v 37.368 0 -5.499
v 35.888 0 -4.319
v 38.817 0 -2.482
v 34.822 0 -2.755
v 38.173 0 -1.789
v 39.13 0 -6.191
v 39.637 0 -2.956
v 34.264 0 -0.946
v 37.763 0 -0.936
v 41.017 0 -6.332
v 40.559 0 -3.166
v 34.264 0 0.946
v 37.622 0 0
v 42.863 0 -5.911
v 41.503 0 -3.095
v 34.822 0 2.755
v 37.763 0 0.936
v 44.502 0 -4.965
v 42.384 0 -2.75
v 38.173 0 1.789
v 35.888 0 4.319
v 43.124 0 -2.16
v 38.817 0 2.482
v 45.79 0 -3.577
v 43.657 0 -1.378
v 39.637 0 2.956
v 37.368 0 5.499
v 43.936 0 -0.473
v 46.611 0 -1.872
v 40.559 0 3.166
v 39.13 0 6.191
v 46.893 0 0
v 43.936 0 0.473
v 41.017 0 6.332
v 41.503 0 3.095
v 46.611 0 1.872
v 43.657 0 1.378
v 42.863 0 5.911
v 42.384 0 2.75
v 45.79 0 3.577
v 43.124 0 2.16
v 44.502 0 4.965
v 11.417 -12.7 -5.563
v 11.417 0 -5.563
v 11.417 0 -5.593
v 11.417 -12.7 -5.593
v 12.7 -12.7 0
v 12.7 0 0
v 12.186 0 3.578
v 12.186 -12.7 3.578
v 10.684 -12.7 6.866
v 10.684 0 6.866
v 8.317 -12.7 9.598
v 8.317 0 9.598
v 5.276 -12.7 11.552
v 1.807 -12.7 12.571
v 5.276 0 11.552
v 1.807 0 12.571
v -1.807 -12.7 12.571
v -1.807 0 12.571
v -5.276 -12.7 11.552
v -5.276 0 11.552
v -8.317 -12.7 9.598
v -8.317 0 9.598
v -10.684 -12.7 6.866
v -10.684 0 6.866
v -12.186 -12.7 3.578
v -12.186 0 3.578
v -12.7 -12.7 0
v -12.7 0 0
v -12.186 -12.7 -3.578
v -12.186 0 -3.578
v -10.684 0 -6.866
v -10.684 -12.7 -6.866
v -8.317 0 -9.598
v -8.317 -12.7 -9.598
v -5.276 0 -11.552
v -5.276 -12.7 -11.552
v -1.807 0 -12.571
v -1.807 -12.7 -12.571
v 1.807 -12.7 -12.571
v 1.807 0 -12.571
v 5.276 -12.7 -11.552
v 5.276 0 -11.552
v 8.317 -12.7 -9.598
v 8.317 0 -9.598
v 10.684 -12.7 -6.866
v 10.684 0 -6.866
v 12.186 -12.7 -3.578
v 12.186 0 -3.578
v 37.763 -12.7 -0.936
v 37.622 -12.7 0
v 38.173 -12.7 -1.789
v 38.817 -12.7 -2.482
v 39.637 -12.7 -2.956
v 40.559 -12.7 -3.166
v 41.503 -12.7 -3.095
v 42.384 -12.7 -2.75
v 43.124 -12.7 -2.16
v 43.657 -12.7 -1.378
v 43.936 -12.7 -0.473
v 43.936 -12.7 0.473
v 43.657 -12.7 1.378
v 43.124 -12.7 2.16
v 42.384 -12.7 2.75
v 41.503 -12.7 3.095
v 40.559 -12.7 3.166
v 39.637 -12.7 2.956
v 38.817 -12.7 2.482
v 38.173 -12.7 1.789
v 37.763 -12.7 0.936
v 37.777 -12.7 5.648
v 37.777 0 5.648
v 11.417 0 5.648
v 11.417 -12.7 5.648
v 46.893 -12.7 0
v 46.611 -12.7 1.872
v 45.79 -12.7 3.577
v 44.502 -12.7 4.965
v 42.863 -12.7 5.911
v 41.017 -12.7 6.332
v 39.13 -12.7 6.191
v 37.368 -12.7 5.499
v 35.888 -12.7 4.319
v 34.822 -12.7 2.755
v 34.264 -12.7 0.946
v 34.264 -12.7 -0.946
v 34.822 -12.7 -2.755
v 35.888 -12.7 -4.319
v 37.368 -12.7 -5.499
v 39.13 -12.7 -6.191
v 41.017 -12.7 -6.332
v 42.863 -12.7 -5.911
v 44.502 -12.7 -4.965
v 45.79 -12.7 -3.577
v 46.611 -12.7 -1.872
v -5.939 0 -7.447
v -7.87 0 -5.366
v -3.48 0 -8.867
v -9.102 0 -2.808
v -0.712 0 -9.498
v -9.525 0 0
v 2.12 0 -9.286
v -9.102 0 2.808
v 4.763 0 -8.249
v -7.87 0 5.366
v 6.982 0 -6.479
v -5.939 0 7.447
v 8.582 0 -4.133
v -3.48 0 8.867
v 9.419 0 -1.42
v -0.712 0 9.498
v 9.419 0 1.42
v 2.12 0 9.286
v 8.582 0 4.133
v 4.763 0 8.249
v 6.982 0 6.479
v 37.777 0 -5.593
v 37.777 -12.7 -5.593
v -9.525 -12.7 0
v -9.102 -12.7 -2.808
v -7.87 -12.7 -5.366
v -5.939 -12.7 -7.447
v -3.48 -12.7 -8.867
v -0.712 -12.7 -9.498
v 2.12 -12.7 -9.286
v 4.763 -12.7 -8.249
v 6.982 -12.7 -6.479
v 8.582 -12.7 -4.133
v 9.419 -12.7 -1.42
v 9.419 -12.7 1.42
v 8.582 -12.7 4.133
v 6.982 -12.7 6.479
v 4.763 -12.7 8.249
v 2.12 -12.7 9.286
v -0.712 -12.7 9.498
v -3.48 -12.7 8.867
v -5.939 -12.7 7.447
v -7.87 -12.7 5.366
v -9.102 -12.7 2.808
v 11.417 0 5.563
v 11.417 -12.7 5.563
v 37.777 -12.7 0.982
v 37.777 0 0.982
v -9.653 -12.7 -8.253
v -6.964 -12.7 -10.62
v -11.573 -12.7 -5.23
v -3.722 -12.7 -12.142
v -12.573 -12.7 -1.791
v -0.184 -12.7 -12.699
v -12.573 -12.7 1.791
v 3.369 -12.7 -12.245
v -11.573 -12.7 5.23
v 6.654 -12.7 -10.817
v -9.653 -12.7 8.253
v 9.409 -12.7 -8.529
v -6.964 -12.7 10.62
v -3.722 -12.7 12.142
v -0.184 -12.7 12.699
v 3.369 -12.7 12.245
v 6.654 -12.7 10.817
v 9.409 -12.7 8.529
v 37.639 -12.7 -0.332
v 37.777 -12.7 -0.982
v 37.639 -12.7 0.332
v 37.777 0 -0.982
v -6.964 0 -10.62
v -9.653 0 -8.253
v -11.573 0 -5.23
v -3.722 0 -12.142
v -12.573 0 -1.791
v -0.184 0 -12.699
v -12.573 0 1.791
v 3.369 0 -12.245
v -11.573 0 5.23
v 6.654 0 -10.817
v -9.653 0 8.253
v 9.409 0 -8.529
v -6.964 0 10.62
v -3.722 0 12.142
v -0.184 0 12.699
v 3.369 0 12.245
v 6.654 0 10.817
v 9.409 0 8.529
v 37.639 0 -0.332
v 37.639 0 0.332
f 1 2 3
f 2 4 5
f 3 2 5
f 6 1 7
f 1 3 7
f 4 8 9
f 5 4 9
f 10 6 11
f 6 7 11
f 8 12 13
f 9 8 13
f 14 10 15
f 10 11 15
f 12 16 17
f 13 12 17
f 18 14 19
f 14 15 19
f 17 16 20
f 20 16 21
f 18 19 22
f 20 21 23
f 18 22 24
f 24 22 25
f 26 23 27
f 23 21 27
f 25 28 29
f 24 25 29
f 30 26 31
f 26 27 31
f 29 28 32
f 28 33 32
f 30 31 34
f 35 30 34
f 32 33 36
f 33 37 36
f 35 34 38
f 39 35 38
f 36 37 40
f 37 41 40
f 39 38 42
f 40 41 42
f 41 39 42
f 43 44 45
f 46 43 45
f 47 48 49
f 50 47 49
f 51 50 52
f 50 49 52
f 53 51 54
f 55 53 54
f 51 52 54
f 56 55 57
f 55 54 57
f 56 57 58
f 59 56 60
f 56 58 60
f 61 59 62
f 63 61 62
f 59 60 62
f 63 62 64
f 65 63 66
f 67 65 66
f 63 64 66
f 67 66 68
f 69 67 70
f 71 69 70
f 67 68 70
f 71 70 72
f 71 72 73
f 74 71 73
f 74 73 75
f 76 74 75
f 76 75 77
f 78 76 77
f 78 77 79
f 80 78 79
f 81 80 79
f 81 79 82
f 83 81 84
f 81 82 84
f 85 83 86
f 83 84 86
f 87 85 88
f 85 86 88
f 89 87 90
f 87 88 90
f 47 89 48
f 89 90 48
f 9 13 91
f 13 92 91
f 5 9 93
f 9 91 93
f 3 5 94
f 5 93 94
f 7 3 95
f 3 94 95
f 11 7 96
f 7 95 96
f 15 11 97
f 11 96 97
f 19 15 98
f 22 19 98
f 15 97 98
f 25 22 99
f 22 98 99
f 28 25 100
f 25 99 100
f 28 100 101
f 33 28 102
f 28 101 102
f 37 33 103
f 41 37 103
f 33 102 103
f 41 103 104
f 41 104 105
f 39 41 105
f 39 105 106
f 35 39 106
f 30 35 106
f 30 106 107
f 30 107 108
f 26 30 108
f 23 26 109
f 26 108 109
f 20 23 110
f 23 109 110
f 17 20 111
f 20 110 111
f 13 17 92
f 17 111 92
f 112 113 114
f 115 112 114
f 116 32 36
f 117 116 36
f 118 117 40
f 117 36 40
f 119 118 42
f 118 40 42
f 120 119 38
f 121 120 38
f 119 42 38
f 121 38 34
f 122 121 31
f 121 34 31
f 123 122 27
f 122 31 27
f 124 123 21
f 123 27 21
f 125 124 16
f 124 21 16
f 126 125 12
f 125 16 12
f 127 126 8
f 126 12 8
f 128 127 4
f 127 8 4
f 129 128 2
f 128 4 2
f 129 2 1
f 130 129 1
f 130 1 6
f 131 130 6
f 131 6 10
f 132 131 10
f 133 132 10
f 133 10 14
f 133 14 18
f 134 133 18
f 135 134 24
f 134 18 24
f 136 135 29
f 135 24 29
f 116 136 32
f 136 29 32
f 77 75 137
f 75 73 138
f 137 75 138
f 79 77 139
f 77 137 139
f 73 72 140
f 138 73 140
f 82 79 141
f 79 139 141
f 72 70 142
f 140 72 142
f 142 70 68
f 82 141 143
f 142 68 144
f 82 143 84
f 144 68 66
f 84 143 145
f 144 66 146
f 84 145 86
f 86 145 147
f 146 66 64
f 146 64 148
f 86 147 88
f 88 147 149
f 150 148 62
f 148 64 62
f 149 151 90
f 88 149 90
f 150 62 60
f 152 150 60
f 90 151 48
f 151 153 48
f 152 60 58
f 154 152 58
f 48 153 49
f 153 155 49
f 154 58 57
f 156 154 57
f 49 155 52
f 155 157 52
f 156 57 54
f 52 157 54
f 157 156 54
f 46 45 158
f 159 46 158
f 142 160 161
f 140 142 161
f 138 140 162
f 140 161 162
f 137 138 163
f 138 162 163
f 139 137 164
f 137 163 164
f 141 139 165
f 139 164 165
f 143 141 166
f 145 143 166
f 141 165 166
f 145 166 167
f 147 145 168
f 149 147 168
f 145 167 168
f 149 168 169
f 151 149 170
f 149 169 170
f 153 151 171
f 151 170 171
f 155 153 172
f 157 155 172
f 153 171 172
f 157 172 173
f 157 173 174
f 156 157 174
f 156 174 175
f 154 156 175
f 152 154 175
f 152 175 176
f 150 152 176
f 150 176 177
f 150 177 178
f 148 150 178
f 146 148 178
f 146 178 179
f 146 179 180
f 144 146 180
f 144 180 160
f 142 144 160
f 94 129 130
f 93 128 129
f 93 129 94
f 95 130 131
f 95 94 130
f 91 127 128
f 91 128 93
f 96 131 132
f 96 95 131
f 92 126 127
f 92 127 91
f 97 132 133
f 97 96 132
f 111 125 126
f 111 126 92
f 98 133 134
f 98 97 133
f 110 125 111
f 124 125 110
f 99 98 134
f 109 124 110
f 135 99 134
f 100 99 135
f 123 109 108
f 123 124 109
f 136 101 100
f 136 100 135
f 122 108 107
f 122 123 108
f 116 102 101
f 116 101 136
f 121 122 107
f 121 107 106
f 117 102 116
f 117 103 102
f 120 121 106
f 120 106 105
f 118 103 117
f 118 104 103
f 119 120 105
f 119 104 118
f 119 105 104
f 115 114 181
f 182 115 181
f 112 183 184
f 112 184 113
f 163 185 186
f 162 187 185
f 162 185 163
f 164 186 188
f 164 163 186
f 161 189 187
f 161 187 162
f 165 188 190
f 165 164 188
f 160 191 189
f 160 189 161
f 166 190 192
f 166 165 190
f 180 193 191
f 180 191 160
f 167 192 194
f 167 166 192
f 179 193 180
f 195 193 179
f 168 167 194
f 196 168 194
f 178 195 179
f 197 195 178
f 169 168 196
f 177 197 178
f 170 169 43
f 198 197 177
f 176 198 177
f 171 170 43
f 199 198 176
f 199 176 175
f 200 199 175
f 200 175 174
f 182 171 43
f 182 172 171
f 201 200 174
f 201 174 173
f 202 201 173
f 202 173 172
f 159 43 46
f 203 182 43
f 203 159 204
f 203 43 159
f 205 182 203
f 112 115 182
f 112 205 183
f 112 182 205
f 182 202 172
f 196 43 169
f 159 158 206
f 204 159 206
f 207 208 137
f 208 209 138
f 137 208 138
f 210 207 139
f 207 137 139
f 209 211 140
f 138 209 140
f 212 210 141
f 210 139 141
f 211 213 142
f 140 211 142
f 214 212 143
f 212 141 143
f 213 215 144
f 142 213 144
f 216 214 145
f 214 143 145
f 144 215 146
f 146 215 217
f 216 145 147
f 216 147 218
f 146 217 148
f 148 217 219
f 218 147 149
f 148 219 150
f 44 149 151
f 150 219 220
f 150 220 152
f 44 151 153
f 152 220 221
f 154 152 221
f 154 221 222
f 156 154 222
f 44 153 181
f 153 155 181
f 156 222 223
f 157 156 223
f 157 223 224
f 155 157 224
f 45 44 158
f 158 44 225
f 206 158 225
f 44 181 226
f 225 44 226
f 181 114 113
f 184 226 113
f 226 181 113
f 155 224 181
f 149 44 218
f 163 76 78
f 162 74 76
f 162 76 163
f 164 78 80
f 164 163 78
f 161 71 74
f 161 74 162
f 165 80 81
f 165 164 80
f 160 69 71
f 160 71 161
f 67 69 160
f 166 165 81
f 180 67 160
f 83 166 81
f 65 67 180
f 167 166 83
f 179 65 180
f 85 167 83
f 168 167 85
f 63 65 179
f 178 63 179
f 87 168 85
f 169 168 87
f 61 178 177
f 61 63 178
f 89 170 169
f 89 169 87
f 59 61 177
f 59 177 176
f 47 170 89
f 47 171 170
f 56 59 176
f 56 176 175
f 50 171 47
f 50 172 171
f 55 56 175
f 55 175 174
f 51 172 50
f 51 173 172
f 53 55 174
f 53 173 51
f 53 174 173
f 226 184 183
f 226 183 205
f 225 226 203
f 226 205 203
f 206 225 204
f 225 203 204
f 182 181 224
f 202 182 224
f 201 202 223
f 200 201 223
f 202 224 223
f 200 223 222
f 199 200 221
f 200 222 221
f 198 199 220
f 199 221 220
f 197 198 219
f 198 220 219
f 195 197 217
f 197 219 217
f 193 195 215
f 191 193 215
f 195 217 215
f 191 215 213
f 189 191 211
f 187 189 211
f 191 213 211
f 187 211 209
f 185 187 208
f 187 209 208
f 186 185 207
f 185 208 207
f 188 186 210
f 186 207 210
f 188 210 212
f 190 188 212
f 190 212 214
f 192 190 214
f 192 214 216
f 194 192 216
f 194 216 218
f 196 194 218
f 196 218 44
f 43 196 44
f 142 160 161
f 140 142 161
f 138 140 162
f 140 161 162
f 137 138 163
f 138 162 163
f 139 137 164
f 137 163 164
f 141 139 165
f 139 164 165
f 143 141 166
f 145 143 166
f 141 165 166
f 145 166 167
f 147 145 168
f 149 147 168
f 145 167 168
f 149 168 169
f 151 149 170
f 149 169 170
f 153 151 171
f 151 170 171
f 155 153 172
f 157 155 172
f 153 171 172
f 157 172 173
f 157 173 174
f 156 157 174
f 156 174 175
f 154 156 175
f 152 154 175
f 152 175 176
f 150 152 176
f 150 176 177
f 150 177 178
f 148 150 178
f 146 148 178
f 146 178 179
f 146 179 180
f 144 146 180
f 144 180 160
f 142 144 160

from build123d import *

# Parameters (mm, degrees)
F3_DEPTH   = 12.7
F0_R       = 12.7
F0_R_2     = 6.35
F5_D       = 19.05
F5_DEPTH   = 25.4
F5_TIP     = 5.7231973962
F5_2_D     = 19.05
F5_2_DEPTH = 25.4
F5_2_TIP   = 5.7231973962
F7_D       = 6.35
F7_DEPTH   = 12.7
F7_TIP     = 1.9077324654
F7_2_D     = 6.35
F7_2_DEPTH = 12.7
F7_2_TIP   = 1.9077324654


with BuildPart() as f3:
    # F1 (on face) → F3 (new body)
    with BuildSketch(Plane.XZ):
        with BuildLine():
            Line((37.7772264183, 5.648068618), (11.4167341962, 5.648068618))
            Line((11.4167341962, 5.648068618), (11.4167341962, 5.5631088694))
            ThreePointArc((11.4167341962, 5.5631088694), (12.3750257433, 2.8545994209), (12.7, 0))
            ThreePointArc((12.7, 0), (12.3750257433, -2.8545994209), (11.4167341962, -5.5631088694))
            Line((11.4167341962, -5.5631088694), (11.4167341962, -5.5927410722))
            Line((11.4167341962, -5.5927410722), (37.7772264183, -5.5927410722))
            Line((37.7772264183, -5.5927410722), (37.7772264183, 5.648068618))
        make_face()
        with BuildLine():
            ThreePointArc((12.7, 0), (12.3750257433, 2.8545994209), (11.4167341962, 5.5631088694))
            Line((11.4167341962, 5.5631088694), (11.4167341962, -5.5631088694))
            ThreePointArc((11.4167341962, -5.5631088694), (12.3750257433, -2.8545994209), (12.7, 0))
        make_face()
        with BuildLine():
            Line((11.4167341962, -5.5631088694), (11.4167341962, 5.5631088694))
            ThreePointArc((11.4167341962, 5.5631088694), (-12.7, 0), (11.4167341962, -5.5631088694))
        make_face()
    extrude(amount=F3_DEPTH)

    # F5
    with Locations(Plane(origin=(0, 0, 0), x_dir=(1, 0, 0), z_dir=(0, 1, 0))):
        with Locations((0, 0)):
            Hole(F5_D / 2, depth=F5_DEPTH)
            with Locations((0, 0, -(F5_DEPTH + F5_TIP / 2))):  # 118° drill point
                Cone(0, F5_D / 2, F5_TIP, mode=Mode.SUBTRACT)

    # F7
    with Locations(Plane(origin=(0, 0, 0), x_dir=(1, 0, 0), z_dir=(0, 1, 0))):
        with Locations((40.7965891063, 0)):
            Hole(F7_D / 2, depth=F7_DEPTH)
            with Locations((0, 0, -(F7_DEPTH + F7_TIP / 2))):  # 118° drill point
                Cone(0, F7_D / 2, F7_TIP, mode=Mode.SUBTRACT)


with BuildPart() as f3b:
    # F0 (on Front) → F3, piece 2 (new body)
    with BuildSketch(Plane.XZ):
        Circle(F0_R)
    extrude(amount=F3_DEPTH)

    # F5#2
    with Locations(Plane(origin=(0, 0, 0), x_dir=(1, 0, 0), z_dir=(0, 1, 0))):
        with Locations((0, 0)):
            Hole(F5_2_D / 2, depth=F5_2_DEPTH)
            with Locations((0, 0, -(F5_2_DEPTH + F5_2_TIP / 2))):  # 118° drill point
                Cone(0, F5_2_D / 2, F5_2_TIP, mode=Mode.SUBTRACT)


with BuildPart() as f3c:
    # F0 (on Front) → F3, piece 3 (new body)
    with BuildSketch(Plane.XZ):
        with Locations((40.5429568411, 0)):
            Circle(F0_R_2)
    extrude(amount=F3_DEPTH)

    # F7#2
    with Locations(Plane(origin=(0, 0, 0), x_dir=(1, 0, 0), z_dir=(0, 1, 0))):
        with Locations((40.7965891063, 0)):
            Hole(F7_2_D / 2, depth=F7_2_DEPTH)
            with Locations((0, 0, -(F7_2_DEPTH + F7_2_TIP / 2))):  # 118° drill point
                Cone(0, F7_2_D / 2, F7_2_TIP, mode=Mode.SUBTRACT)


solid = Compound([f3.part, f3b.part, f3c.part])
